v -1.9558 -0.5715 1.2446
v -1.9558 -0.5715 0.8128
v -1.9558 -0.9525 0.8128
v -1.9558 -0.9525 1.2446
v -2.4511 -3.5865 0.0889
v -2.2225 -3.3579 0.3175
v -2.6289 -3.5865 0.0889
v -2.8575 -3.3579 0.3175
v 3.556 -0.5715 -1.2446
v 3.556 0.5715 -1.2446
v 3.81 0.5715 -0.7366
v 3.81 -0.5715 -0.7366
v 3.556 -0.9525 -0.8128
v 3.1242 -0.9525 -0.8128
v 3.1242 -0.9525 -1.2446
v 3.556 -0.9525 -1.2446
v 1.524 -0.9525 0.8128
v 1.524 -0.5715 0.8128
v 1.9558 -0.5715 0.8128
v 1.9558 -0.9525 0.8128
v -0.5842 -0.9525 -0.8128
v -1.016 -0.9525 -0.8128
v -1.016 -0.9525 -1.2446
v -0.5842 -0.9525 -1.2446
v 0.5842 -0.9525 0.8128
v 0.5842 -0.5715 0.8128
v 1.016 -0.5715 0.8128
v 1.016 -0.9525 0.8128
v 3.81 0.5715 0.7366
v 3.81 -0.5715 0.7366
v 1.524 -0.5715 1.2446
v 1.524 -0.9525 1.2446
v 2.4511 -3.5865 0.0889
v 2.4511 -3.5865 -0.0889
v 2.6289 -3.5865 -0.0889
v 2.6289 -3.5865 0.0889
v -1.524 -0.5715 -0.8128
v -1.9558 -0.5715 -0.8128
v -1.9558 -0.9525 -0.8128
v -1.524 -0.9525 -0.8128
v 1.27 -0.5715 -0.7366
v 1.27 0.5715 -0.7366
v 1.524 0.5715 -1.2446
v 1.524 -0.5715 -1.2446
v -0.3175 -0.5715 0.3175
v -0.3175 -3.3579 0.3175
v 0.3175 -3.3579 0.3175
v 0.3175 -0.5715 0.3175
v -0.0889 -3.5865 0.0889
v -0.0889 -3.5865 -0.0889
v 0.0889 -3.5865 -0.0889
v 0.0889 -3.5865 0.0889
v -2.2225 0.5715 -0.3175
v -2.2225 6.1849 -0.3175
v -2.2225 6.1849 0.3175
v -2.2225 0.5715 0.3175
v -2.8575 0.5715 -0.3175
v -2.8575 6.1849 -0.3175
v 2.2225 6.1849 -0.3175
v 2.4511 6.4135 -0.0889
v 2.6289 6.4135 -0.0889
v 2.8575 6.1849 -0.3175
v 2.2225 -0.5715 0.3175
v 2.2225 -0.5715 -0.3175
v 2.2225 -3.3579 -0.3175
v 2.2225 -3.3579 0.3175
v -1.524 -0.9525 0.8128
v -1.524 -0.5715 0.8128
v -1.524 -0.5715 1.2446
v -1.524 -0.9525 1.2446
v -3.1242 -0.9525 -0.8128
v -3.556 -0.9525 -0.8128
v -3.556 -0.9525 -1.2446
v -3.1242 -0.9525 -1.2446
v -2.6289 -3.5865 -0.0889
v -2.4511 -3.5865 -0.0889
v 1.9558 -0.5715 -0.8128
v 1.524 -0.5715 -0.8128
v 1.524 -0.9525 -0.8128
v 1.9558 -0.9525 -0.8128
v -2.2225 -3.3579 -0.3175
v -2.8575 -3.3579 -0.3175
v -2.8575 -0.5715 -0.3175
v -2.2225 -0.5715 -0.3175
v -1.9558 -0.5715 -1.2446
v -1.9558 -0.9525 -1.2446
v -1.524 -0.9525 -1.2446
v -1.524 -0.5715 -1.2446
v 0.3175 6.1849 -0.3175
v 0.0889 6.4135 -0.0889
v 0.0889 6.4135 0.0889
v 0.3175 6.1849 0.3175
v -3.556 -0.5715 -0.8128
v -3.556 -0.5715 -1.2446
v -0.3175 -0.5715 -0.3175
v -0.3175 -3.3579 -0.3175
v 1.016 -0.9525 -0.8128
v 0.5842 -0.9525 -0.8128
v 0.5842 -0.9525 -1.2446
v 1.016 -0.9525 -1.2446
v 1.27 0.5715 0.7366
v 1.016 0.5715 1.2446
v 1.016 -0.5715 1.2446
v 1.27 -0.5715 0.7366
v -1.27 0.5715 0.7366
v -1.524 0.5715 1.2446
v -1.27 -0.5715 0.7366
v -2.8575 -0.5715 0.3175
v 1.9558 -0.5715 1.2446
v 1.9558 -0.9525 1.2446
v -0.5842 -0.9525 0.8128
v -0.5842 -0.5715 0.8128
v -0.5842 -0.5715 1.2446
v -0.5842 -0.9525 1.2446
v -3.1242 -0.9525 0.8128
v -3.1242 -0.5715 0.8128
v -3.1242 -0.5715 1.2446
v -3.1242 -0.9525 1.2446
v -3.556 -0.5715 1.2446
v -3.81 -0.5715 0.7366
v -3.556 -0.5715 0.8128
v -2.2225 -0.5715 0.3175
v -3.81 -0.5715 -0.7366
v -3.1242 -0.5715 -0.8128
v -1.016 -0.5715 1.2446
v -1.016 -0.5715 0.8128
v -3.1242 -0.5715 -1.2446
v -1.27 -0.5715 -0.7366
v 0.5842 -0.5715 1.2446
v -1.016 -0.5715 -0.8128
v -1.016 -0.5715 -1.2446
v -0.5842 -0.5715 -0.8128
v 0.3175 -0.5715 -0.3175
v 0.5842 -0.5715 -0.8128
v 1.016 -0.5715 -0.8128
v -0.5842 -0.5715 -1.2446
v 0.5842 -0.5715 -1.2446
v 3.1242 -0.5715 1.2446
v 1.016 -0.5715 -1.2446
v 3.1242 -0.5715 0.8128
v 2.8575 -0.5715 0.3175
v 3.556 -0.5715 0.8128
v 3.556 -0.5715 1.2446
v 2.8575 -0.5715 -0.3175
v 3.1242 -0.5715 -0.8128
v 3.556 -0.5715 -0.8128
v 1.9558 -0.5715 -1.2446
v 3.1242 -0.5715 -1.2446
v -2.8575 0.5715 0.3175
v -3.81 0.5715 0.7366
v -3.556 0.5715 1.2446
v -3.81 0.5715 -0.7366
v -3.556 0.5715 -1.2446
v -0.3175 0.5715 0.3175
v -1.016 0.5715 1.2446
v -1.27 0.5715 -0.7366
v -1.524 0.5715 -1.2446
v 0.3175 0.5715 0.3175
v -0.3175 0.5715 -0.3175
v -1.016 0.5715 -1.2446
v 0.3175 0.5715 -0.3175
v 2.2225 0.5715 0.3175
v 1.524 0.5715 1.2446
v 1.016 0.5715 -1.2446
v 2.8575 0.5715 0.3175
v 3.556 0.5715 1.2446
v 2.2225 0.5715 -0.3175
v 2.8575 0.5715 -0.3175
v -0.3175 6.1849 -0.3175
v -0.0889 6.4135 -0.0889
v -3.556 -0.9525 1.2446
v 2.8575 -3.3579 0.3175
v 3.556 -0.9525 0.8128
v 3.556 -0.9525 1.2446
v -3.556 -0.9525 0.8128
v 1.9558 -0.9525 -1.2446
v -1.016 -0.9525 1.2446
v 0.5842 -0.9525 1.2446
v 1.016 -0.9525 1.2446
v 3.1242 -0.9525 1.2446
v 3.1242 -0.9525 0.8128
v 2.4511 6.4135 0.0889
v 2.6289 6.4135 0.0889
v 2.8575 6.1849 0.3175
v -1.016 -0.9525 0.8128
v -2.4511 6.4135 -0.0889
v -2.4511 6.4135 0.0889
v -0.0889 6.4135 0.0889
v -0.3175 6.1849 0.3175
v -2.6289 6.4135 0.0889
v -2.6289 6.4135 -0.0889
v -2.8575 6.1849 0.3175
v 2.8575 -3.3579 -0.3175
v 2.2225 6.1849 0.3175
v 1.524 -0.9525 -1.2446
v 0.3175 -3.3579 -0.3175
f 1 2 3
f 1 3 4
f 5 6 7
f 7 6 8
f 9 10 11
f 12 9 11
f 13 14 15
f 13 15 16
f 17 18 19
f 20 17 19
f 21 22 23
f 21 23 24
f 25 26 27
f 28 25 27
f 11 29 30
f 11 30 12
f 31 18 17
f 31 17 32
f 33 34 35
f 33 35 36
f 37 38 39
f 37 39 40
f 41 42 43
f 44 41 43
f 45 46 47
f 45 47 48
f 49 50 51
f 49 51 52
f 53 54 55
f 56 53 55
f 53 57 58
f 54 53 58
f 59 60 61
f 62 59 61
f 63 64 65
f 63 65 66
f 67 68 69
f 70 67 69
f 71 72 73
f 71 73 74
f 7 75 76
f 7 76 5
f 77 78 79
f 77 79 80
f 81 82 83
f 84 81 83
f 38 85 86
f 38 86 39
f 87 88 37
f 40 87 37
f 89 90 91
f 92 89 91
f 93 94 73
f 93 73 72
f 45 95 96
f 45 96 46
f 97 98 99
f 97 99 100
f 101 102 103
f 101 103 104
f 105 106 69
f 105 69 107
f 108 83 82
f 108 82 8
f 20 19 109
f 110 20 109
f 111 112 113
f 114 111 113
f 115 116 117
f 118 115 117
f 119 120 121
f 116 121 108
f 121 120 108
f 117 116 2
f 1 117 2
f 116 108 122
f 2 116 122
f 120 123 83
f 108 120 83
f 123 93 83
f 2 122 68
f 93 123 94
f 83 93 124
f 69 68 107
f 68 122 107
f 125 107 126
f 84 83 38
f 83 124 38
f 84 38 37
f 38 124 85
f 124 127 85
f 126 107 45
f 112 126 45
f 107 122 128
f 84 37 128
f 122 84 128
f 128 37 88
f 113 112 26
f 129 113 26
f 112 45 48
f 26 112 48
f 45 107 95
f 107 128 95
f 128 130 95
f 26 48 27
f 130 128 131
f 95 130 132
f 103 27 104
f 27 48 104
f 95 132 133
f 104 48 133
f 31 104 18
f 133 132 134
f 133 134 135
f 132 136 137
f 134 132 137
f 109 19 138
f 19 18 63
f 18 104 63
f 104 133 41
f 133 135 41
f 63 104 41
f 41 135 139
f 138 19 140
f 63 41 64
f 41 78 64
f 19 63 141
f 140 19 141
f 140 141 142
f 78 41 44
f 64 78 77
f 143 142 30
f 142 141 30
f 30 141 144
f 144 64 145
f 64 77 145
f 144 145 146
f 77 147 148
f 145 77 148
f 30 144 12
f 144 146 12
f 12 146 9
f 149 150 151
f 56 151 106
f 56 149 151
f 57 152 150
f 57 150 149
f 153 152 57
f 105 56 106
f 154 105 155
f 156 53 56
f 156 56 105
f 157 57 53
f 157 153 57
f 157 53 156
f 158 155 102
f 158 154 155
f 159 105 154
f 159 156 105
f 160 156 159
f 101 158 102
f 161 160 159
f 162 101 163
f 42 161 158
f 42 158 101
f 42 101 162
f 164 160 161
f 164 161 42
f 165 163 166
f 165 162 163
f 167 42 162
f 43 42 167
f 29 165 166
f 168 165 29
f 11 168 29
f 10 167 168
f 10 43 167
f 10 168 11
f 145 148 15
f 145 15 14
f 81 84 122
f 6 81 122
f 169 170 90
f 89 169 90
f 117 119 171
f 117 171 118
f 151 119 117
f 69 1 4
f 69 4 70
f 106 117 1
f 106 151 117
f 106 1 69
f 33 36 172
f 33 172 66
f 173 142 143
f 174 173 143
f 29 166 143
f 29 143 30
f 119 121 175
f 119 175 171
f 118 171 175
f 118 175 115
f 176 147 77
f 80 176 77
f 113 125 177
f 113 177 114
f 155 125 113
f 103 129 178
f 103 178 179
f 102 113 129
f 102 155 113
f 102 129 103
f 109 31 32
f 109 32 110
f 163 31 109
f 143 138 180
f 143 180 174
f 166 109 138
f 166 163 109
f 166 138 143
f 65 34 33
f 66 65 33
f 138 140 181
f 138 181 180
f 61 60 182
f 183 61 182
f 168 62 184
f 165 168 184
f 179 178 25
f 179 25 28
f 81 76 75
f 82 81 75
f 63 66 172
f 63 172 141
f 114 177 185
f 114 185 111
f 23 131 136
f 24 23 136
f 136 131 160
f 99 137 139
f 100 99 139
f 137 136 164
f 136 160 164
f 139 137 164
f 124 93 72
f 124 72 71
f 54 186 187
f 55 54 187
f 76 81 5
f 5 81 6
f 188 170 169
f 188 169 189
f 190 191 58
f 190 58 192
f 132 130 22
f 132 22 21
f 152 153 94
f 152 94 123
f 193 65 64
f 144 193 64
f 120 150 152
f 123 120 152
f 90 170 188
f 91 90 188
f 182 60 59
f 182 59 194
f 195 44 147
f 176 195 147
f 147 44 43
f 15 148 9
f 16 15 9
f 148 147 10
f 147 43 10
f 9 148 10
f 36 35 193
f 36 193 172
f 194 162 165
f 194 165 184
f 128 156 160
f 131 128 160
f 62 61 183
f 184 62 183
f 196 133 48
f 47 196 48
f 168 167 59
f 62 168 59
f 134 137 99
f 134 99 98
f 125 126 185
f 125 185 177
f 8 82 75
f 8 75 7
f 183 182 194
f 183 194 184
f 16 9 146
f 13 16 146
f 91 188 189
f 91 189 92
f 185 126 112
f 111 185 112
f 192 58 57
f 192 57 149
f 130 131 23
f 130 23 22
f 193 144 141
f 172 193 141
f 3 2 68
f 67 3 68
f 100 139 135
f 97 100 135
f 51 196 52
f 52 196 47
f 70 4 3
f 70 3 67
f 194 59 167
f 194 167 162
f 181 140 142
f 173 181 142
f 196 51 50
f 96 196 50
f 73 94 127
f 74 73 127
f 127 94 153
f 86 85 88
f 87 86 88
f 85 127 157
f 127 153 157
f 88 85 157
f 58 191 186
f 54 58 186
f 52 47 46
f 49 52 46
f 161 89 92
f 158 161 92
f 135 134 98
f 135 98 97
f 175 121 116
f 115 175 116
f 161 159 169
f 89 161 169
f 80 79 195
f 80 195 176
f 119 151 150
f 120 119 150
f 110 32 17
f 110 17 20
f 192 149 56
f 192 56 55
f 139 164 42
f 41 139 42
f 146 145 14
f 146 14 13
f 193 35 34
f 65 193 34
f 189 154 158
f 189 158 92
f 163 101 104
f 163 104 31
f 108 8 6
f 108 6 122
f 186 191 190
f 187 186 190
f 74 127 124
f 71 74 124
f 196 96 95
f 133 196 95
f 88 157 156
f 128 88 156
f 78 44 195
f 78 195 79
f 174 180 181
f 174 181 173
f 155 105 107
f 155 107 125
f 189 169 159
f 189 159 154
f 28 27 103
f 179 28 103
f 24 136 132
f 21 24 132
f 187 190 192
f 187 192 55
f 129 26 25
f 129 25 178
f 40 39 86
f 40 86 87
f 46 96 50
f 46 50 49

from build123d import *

# Parameters (mm, degrees)
SKETCH1_W                        = 7.62
SKETCH1_H                        = 2.4892
BASE_EXTRUDE_DEPTH               = 0.5715
SNAP_GROOVES_DEPTH               = 2.143
SKETCH4_W                        = 0.4318
SKETCH4_H                        = 0.4318
STANDOFFS_DEPTH                  = 0.381
POSITION_PATTERN_COUNT           = 3
POSITION_PATTERN_PITCH           = 2.54
SKETCH5_W                        = 0.635
SKETCH5_H                        = 10
TERMINAL_TH_DEPTH                = 0.3175
T1_TIP1_SIZE                     = 0.2286
TERMINAL_PATTERN_COUNT           = 3
TERMINAL_PATTERN_PITCH           = 2.54
T1_TIP1_OF_TERMINAL_PATTERN_SIZE = 0.2286


with BuildPart() as part:
    # Sketch1 → Base-Extrude (new body, symmetric)
    with BuildSketch(Plane(origin=(0, 0, 0), x_dir=(1, 0, 0), z_dir=(0, 1, 0))):
        Rectangle(SKETCH1_W, SKETCH1_H)
    extrude(amount=BASE_EXTRUDE_DEPTH, both=True)

    # Sketch3 → Snap Grooves (cut, through all)
    with BuildSketch(Plane(origin=(0, 0.5715, 0), x_dir=(-1, 0, 0), z_dir=(0, 1, 0))):
        Polygon((1.016, 1.2446), (1.524, 1.2446), (1.27, 0.7366), align=None)
        Polygon((1.016, -1.2446), (1.524, -1.2446), (1.27, -0.7366), align=None)
        Polygon((3.81, -0.7366), (4.064, -1.2446), (3.556, -1.2446), align=None)
        Polygon((3.81, 0.7366), (4.064, 1.2446), (3.556, 1.2446), align=None)
    snap_grooves = extrude(amount=-SNAP_GROOVES_DEPTH, mode=Mode.SUBTRACT)

    # Sketch4 → Standoffs (add)
    with BuildSketch(Plane.XZ.offset(0.5715)):
        with Locations((-3.3401, 1.0287)):
            Rectangle(SKETCH4_W, SKETCH4_H)
        with Locations((-1.7399, 1.0287)):
            Rectangle(SKETCH4_W, SKETCH4_H)
        with Locations((-1.7399, -1.0287)):
            Rectangle(SKETCH4_W, SKETCH4_H)
        with Locations((-3.3401, -1.0287)):
            Rectangle(SKETCH4_W, SKETCH4_H)
    standoffs = extrude(amount=STANDOFFS_DEPTH)

    # Position Pattern: Snap Grooves, Standoffs ×3
    with Locations(*[(i * POSITION_PATTERN_PITCH, 0, 0) for i in range(1, POSITION_PATTERN_COUNT)]):
        add(snap_grooves, mode=Mode.SUBTRACT)
        add(standoffs)

    # Sketch5 → Terminal -TH (add, symmetric)
    with BuildSketch(Plane.ZY.offset(2.54)):
        with Locations((0, 1.4135)):
            Rectangle(SKETCH5_W, SKETCH5_H)
    terminal_th = extrude(amount=TERMINAL_TH_DEPTH, both=True)

    # T1 Tip1
    t1_tip1_edges = [part.edges().sort_by_distance(p)[0] for p in [
        (-2.54, -3.5865, 0.3175),
        (-2.8575, -3.5865, 0),
        (-2.54, 6.4135, -0.3175),
        (-2.2225, -3.5865, 0),
        (-2.54, -3.5865, -0.3175),
        (-2.2225, 6.4135, 0),
        (-2.54, 6.4135, 0.3175),
        (-2.8575, 6.4135, 0),
    ]]
    chamfer(t1_tip1_edges, length=T1_TIP1_SIZE)

    # Terminal Pattern: Terminal -TH ×3
    with Locations(*[(i * TERMINAL_PATTERN_PITCH, 0, 0) for i in range(1, TERMINAL_PATTERN_COUNT)]):
        add(terminal_th)

    # T1 Tip1 of Terminal Pattern
    t1_tip1_of_terminal_pattern_edges = [part.edges().sort_by_distance(p)[0] for p in [
        (0, -3.5865, 0.3175),
        (-0.3175, -3.5865, 0),
        (0, 6.4135, -0.3175),
        (0.3175, -3.5865, 0),
        (0, -3.5865, -0.3175),
        (0.3175, 6.4135, 0),
        (0, 6.4135, 0.3175),
        (-0.3175, 6.4135, 0),
        (2.54, -3.5865, 0.3175),
        (2.2225, -3.5865, 0),
        (2.54, 6.4135, -0.3175),
        (2.8575, -3.5865, 0),
        (2.54, -3.5865, -0.3175),
        (2.8575, 6.4135, 0),
        (2.54, 6.4135, 0.3175),
        (2.2225, 6.4135, 0),
    ]]
    chamfer(t1_tip1_of_terminal_pattern_edges, length=T1_TIP1_OF_TERMINAL_PATTERN_SIZE)


solid = part.part
